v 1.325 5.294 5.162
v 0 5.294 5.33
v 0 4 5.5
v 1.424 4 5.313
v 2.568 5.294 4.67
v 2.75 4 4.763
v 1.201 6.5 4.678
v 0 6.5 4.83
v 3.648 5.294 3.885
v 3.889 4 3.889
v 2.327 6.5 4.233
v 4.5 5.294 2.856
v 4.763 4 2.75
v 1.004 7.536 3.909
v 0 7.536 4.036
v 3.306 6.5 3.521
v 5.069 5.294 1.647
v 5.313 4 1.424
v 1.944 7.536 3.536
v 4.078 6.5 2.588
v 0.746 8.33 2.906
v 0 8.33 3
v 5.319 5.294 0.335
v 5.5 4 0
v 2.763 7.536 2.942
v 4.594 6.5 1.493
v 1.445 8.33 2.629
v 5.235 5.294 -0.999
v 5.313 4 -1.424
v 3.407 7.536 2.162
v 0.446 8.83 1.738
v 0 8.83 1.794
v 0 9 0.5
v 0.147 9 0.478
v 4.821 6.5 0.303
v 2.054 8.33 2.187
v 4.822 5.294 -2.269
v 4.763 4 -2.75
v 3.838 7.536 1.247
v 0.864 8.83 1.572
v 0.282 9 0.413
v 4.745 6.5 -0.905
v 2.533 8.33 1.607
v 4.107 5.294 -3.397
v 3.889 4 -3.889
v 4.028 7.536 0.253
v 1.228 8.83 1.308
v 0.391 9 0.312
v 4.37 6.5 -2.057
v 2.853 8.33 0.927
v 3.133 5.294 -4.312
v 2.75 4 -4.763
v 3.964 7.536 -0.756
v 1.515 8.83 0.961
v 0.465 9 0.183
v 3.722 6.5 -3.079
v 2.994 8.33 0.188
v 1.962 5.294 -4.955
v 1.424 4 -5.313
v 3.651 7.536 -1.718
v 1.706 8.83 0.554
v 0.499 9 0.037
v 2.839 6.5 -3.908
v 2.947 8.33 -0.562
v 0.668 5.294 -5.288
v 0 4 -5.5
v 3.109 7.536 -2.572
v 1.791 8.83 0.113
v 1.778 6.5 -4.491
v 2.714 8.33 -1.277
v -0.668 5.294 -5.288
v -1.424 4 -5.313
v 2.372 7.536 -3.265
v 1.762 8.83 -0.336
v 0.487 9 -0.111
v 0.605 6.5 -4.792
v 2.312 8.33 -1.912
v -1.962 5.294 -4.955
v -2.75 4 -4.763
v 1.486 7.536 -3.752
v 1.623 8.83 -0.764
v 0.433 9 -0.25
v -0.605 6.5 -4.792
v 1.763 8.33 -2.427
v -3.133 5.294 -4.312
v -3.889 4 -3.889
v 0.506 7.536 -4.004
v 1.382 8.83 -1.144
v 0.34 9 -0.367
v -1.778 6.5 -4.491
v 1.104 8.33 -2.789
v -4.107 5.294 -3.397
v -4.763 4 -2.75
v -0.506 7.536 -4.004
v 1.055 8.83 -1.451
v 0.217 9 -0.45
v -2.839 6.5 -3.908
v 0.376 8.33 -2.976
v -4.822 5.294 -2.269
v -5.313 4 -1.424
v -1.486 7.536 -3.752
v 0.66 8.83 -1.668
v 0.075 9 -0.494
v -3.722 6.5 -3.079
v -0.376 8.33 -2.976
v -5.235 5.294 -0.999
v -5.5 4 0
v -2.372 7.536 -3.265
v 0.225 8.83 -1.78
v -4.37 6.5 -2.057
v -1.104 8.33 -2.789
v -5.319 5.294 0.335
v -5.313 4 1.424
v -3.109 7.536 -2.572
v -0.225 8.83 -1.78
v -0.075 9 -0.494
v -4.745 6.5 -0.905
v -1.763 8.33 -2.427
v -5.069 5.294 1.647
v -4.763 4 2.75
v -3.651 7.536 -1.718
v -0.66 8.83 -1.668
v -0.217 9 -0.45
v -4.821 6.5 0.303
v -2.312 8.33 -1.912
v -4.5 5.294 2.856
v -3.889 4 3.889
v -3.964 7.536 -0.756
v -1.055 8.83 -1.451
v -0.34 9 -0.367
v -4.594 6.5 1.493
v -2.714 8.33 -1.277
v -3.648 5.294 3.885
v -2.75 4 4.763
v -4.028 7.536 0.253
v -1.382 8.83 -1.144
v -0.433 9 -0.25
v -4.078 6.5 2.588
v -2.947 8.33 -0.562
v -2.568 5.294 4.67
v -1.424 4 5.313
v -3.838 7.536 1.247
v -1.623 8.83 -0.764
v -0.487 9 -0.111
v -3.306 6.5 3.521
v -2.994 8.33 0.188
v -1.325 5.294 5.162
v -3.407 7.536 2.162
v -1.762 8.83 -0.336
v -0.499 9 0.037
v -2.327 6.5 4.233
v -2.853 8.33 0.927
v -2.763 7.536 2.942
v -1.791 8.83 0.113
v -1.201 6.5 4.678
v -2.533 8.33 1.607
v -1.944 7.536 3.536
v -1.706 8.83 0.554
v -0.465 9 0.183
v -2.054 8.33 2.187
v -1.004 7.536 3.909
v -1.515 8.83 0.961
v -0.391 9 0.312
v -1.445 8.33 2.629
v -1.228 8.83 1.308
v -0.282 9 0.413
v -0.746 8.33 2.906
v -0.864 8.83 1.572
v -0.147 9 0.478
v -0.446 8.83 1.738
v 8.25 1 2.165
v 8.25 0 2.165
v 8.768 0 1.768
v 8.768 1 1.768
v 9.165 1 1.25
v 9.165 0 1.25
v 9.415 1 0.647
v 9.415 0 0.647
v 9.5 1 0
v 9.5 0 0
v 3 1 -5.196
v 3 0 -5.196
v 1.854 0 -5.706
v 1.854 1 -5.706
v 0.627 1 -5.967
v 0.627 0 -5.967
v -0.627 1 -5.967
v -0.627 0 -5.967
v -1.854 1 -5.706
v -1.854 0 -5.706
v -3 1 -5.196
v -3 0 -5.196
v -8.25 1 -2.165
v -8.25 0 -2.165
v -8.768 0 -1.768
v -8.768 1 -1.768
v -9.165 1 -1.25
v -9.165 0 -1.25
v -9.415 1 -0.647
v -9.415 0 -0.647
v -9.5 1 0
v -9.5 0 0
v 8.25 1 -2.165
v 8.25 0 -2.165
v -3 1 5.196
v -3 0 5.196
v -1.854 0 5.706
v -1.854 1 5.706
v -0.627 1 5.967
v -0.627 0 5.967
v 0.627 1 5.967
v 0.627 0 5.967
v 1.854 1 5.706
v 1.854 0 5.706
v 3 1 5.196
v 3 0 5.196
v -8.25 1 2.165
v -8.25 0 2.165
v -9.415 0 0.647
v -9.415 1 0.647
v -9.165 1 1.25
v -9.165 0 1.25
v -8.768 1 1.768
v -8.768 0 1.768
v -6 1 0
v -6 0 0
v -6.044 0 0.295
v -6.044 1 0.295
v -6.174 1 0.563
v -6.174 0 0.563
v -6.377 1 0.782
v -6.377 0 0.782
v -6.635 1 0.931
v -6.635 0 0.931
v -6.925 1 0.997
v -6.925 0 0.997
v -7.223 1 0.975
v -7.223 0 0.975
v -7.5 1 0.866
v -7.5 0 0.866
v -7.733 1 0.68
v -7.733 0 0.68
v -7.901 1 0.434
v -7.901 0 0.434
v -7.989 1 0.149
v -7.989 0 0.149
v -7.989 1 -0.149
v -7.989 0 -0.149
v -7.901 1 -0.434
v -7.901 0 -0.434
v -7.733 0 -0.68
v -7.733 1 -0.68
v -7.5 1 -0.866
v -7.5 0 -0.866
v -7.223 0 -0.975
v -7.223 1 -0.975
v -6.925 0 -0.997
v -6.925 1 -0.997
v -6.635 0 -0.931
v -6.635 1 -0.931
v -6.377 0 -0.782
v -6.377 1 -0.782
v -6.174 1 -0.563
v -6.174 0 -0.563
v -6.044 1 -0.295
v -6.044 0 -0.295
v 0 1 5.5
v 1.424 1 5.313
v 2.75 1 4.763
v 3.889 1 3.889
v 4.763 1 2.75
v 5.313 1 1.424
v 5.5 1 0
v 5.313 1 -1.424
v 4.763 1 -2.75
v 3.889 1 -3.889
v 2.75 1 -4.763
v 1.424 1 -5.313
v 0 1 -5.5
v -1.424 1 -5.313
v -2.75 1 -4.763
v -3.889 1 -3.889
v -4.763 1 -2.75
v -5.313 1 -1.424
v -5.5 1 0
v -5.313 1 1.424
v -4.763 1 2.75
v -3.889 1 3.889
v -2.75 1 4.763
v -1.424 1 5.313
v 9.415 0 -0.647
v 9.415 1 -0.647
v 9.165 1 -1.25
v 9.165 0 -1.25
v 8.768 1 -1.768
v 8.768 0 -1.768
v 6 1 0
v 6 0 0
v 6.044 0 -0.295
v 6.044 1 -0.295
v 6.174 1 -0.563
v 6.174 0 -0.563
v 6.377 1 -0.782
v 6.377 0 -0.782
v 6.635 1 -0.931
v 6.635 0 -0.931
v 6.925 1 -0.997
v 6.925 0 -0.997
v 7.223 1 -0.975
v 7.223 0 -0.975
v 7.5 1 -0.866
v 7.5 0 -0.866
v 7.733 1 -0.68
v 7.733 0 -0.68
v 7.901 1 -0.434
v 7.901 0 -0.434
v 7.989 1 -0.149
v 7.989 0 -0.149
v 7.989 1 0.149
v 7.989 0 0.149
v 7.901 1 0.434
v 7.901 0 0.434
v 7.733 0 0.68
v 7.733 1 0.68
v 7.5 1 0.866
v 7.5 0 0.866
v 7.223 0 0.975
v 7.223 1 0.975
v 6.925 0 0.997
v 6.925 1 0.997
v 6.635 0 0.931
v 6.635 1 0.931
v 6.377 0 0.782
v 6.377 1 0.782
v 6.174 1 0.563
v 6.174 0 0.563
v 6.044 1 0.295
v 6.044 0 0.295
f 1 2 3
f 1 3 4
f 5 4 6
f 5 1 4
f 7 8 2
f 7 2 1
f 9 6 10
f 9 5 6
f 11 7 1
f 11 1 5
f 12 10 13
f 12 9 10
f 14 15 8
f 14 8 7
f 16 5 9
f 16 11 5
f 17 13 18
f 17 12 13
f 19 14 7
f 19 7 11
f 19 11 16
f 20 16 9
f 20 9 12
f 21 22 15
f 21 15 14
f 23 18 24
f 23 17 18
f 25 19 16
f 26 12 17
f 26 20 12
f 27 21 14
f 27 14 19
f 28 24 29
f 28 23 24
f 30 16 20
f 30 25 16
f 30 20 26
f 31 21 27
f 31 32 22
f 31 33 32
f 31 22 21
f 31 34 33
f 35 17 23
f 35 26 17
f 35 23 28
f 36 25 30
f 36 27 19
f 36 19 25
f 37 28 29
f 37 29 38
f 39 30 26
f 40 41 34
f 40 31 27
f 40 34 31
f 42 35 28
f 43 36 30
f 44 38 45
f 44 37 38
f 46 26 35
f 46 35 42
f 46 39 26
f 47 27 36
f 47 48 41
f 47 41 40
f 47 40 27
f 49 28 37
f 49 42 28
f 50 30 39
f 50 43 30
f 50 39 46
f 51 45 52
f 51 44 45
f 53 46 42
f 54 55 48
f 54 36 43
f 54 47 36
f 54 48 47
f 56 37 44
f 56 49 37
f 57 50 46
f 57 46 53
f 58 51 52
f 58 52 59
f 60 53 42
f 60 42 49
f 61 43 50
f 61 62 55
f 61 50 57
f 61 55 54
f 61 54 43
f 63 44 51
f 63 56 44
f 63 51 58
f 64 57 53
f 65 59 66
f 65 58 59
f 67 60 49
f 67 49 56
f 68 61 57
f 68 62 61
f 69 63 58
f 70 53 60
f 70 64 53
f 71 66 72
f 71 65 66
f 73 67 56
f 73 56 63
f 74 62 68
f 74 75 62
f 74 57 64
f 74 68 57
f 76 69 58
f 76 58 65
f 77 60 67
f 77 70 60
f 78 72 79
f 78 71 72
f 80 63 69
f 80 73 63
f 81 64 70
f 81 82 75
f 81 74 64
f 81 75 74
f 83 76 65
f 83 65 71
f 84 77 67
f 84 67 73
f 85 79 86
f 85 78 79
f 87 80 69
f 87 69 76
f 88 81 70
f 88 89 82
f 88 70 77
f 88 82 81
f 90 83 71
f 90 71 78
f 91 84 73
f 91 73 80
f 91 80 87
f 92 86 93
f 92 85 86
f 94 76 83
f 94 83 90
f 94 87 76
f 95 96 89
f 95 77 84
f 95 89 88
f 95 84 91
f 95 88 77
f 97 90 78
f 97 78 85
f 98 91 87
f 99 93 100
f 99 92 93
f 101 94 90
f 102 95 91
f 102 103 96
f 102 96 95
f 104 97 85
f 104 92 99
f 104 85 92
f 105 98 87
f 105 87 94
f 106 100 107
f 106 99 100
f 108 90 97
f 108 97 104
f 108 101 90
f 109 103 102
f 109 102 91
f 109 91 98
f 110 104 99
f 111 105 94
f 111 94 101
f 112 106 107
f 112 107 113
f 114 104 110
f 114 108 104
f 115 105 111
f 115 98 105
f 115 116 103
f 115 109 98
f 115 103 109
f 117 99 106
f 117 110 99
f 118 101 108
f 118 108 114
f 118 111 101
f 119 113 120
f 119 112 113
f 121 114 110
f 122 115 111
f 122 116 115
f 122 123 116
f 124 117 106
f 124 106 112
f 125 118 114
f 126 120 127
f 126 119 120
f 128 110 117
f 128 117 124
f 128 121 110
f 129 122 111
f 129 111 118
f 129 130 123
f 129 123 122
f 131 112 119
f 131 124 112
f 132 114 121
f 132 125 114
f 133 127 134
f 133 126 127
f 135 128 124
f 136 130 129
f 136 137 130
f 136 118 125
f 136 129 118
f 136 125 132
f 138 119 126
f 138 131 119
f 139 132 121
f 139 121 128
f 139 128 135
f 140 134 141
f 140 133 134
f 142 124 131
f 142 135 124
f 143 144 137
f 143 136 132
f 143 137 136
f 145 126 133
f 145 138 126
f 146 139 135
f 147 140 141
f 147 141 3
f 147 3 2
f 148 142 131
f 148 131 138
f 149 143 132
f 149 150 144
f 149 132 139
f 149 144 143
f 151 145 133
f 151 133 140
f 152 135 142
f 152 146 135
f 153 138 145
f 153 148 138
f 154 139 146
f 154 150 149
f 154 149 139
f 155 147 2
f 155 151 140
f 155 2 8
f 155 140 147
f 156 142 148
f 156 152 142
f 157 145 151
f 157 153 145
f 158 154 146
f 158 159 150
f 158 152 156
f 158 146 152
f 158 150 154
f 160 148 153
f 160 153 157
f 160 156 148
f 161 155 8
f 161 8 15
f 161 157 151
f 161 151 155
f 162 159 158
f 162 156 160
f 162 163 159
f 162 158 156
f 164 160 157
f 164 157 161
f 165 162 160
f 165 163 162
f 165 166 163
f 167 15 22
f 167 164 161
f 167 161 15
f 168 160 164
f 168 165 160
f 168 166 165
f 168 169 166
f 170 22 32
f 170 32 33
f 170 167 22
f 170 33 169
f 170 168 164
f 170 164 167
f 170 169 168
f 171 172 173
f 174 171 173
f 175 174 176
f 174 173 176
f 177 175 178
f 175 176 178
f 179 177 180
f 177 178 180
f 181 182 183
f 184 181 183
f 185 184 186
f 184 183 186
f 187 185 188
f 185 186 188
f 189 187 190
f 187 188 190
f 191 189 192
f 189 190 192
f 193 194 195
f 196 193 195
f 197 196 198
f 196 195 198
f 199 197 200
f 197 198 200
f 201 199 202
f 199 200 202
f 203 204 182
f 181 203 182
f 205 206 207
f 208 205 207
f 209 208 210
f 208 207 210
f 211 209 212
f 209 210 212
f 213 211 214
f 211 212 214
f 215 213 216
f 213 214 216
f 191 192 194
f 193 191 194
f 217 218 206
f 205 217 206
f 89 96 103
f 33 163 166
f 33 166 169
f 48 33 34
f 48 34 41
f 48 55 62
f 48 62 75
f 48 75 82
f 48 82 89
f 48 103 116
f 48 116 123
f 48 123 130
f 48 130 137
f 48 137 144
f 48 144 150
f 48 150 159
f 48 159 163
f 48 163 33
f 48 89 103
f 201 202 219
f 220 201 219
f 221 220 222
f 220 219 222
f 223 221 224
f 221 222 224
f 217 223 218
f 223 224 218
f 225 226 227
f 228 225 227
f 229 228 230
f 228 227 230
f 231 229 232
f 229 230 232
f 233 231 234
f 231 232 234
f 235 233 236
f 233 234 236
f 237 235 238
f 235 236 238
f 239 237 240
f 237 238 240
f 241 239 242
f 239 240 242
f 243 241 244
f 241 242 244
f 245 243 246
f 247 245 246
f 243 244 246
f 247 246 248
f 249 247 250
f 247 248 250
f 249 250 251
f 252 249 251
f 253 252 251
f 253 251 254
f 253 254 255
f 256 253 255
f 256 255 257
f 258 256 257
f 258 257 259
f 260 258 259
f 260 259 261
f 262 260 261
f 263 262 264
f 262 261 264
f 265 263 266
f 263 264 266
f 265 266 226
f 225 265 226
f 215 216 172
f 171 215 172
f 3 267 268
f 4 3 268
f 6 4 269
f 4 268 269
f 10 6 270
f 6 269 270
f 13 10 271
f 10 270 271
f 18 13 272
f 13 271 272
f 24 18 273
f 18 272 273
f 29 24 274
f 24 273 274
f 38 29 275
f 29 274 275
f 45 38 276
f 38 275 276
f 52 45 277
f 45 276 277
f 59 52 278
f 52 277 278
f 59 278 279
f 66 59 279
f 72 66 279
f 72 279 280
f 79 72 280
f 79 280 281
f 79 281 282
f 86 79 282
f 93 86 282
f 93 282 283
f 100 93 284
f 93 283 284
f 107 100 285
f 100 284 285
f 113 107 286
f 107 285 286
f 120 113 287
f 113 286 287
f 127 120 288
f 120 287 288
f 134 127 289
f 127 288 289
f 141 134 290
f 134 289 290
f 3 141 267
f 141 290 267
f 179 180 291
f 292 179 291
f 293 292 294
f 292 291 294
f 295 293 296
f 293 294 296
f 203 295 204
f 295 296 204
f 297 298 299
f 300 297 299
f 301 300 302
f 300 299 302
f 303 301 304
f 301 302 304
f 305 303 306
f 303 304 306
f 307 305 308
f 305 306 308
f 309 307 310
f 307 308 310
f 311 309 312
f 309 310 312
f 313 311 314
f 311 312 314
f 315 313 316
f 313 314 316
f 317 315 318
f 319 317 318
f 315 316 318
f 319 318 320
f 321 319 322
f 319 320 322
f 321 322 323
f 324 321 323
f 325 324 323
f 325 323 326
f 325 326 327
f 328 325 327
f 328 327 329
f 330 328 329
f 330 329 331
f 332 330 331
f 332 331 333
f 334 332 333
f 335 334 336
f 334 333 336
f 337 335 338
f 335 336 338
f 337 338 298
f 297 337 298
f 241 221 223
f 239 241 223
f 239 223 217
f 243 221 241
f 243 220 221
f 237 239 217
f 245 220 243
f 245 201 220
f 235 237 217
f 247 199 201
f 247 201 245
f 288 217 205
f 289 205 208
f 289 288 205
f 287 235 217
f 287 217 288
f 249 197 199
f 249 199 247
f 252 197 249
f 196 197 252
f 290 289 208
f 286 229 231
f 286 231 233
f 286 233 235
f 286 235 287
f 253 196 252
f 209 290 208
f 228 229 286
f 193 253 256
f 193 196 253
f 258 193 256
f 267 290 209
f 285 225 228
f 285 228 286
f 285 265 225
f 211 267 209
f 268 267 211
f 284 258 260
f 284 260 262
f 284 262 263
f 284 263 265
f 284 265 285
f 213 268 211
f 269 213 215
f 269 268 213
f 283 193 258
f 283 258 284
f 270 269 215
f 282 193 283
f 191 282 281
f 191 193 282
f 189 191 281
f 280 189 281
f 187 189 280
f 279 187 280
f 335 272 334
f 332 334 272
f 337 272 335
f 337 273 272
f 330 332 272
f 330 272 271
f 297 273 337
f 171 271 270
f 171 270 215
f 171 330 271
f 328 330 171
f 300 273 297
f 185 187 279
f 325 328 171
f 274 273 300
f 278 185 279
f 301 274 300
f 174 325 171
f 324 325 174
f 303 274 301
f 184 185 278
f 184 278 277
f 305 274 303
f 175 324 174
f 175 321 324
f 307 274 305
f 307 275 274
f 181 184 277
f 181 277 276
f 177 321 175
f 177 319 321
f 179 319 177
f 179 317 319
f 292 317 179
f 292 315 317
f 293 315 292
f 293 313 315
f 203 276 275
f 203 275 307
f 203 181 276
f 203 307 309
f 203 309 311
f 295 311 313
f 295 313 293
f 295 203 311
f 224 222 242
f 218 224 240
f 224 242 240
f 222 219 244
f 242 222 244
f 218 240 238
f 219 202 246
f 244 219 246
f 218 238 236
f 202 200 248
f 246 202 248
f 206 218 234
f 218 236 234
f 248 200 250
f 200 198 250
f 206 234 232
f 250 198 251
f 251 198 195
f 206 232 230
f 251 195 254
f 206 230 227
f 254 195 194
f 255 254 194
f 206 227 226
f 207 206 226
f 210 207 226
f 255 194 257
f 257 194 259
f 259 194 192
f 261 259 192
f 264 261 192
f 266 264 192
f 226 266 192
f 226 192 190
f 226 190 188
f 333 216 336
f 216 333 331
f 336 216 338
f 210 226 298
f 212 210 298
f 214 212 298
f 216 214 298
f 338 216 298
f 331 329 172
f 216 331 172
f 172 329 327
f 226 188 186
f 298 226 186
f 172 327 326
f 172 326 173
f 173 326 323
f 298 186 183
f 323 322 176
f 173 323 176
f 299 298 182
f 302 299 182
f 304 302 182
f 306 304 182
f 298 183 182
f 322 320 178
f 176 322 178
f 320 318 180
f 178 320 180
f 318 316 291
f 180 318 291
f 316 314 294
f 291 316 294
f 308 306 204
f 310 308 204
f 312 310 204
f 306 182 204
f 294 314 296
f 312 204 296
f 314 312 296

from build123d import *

# Parameters (mm, degrees)
BOSS_EXTRUDE1_DEPTH = 1
SKETCH2_R           = 5.5
BOSS_EXTRUDE2_DEPTH = 8
FILLET1_R           = 5


with BuildPart() as part:
    # Sketch1 → Boss-Extrude1 (new body)
    with BuildSketch(Plane(origin=(0, 0, 0), x_dir=(1, 0, 0), z_dir=(0, 1, 0))):
        with BuildLine():
            ThreePointArc((-8, 0), (-7, 1), (-6, 0))
            ThreePointArc((-6, 0), (-5.905505906, 1.060660172), (-5.625, 2.087911636))
            ThreePointArc((-5.625, 2.087911636), (-6.926553741, 2.498920897), (-8.25, 2.165063509))
            ThreePointArc((-8.25, 2.165063509), (-9.165063509, 1.25), (-9.5, 0))
            Line((-9.5, 0), (-8, 0))
        make_face()
        with BuildLine():
            ThreePointArc((-5.625, -2.087911636), (-5.905505906, -1.060660172), (-6, 0))
            ThreePointArc((-6, 0), (-7, -1), (-8, 0))
            Line((-8, 0), (-9.5, 0))
            ThreePointArc((-9.5, 0), (-9.165063509, -1.25), (-8.25, -2.165063509))
            ThreePointArc((-8.25, -2.165063509), (-6.926553741, -2.498920897), (-5.625, -2.087911636))
        make_face()
        with BuildLine():
            ThreePointArc((-5.625, 2.087911636), (-5.905505906, 1.060660172), (-6, 0))
            Line((-6, 0), (-4.5, 0))
            ThreePointArc((-4.5, 0), (-4.799147892, 1.185854123), (-5.625, 2.087911636))
        make_face()
        with BuildLine():
            Line((-4.5, 0), (-6, 0))
            ThreePointArc((-6, 0), (-5.905505906, -1.060660172), (-5.625, -2.087911636))
            ThreePointArc((-5.625, -2.087911636), (-4.799147892, -1.185854123), (-4.5, 0))
        make_face()
        with BuildLine():
            ThreePointArc((-8.25, 2.165063509), (-6.926553741, 2.498920897), (-5.625, 2.087911636))
            ThreePointArc((-5.625, 2.087911636), (-4.58398805, 3.871311606), (-3, 5.196152423))
            Line((-3, 5.196152423), (-8.25, 2.165063509))
        make_face()
        with BuildLine():
            ThreePointArc((-3, -5.196152423), (-4.58398805, -3.871311606), (-5.625, -2.087911636))
            ThreePointArc((-5.625, -2.087911636), (-6.926553741, -2.498920897), (-8.25, -2.165063509))
            Line((-8.25, -2.165063509), (-3, -5.196152423))
        make_face()
        with BuildLine():
            Line((4.5, 0), (-4.5, 0))
            ThreePointArc((-4.5, 0), (-4.799147892, -1.185854123), (-5.625, -2.087911636))
            ThreePointArc((-5.625, -2.087911636), (-4.58398805, -3.871311606), (-3, -5.196152423))
            Line((-3, -5.196152423), (3, -5.196152423))
            ThreePointArc((3, -5.196152423), (4.58398805, -3.871311606), (5.625, -2.087911636))
            ThreePointArc((5.625, -2.087911636), (4.799147892, -1.185854123), (4.5, 0))
        make_face()
        with BuildLine():
            ThreePointArc((-5.625, 2.087911636), (-4.799147892, 1.185854123), (-4.5, 0))
            Line((-4.5, 0), (4.5, 0))
            ThreePointArc((4.5, 0), (4.799147892, 1.185854123), (5.625, 2.087911636))
            ThreePointArc((5.625, 2.087911636), (4.58398805, 3.871311606), (3, 5.196152423))
            ThreePointArc((3, 5.196152423), (0, 6), (-3, 5.196152423))
            ThreePointArc((-3, 5.196152423), (-4.58398805, 3.871311606), (-5.625, 2.087911636))
        make_face()
        with BuildLine():
            Line((3, -5.196152423), (-3, -5.196152423))
            ThreePointArc((-3, -5.196152423), (0, -6), (3, -5.196152423))
        make_face()
        with BuildLine():
            ThreePointArc((3, 5.196152423), (4.58398805, 3.871311606), (5.625, 2.087911636))
            ThreePointArc((5.625, 2.087911636), (6.926553741, 2.498920897), (8.25, 2.165063509))
            Line((8.25, 2.165063509), (3, 5.196152423))
        make_face()
        with BuildLine():
            ThreePointArc((8.25, -2.165063509), (6.926553741, -2.498920897), (5.625, -2.087911636))
            ThreePointArc((5.625, -2.087911636), (4.58398805, -3.871311606), (3, -5.196152423))
            Line((3, -5.196152423), (8.25, -2.165063509))
        make_face()
        with BuildLine():
            ThreePointArc((5.625, 2.087911636), (4.799147892, 1.185854123), (4.5, 0))
            Line((4.5, 0), (6, 0))
            ThreePointArc((6, 0), (5.905505906, 1.060660172), (5.625, 2.087911636))
        make_face()
        with BuildLine():
            Line((6, 0), (4.5, 0))
            ThreePointArc((4.5, 0), (4.799147892, -1.185854123), (5.625, -2.087911636))
            ThreePointArc((5.625, -2.087911636), (5.905505906, -1.060660172), (6, 0))
        make_face()
        with BuildLine():
            ThreePointArc((8, 0), (7, -1), (6, 0))
            ThreePointArc((6, 0), (5.905505906, -1.060660172), (5.625, -2.087911636))
            ThreePointArc((5.625, -2.087911636), (6.926553741, -2.498920897), (8.25, -2.165063509))
            Line((8.25, -2.165063509), (8.25, 0))
            Line((8.25, 0), (8, 0))
        make_face()
        with BuildLine():
            ThreePointArc((5.625, 2.087911636), (5.905505906, 1.060660172), (6, 0))
            ThreePointArc((6, 0), (7, 1), (8, 0))
            Line((8, 0), (8.25, 0))
            Line((8.25, 0), (8.25, 2.165063509))
            ThreePointArc((8.25, 2.165063509), (6.926553741, 2.498920897), (5.625, 2.087911636))
        make_face()
        with BuildLine():
            ThreePointArc((9.5, 0), (9.165063509, 1.25), (8.25, 2.165063509))
            Line((8.25, 2.165063509), (8.25, 0))
            Line((8.25, 0), (9.5, 0))
        make_face()
        with BuildLine():
            Line((8.25, 0), (8.25, -2.165063509))
            ThreePointArc((8.25, -2.165063509), (9.165063509, -1.25), (9.5, 0))
            Line((9.5, 0), (8.25, 0))
        make_face()
    extrude(amount=BOSS_EXTRUDE1_DEPTH)

    # Sketch2 → Boss-Extrude2 (add)
    with BuildSketch(Plane(origin=(0, 1, 0), x_dir=(1, 0, 0), z_dir=(0, 1, 0))):
        with Locations(Location((0, 0, 0), (0, 0, 270))):
            Circle(SKETCH2_R)
    extrude(amount=BOSS_EXTRUDE2_DEPTH)

    # Fillet1
    fillet1_edges = [part.edges().sort_by_distance(p)[0] for p in [
        (0, 9, -5.5),
    ]]
    fillet(fillet1_edges, radius=FILLET1_R)


solid = part.part
